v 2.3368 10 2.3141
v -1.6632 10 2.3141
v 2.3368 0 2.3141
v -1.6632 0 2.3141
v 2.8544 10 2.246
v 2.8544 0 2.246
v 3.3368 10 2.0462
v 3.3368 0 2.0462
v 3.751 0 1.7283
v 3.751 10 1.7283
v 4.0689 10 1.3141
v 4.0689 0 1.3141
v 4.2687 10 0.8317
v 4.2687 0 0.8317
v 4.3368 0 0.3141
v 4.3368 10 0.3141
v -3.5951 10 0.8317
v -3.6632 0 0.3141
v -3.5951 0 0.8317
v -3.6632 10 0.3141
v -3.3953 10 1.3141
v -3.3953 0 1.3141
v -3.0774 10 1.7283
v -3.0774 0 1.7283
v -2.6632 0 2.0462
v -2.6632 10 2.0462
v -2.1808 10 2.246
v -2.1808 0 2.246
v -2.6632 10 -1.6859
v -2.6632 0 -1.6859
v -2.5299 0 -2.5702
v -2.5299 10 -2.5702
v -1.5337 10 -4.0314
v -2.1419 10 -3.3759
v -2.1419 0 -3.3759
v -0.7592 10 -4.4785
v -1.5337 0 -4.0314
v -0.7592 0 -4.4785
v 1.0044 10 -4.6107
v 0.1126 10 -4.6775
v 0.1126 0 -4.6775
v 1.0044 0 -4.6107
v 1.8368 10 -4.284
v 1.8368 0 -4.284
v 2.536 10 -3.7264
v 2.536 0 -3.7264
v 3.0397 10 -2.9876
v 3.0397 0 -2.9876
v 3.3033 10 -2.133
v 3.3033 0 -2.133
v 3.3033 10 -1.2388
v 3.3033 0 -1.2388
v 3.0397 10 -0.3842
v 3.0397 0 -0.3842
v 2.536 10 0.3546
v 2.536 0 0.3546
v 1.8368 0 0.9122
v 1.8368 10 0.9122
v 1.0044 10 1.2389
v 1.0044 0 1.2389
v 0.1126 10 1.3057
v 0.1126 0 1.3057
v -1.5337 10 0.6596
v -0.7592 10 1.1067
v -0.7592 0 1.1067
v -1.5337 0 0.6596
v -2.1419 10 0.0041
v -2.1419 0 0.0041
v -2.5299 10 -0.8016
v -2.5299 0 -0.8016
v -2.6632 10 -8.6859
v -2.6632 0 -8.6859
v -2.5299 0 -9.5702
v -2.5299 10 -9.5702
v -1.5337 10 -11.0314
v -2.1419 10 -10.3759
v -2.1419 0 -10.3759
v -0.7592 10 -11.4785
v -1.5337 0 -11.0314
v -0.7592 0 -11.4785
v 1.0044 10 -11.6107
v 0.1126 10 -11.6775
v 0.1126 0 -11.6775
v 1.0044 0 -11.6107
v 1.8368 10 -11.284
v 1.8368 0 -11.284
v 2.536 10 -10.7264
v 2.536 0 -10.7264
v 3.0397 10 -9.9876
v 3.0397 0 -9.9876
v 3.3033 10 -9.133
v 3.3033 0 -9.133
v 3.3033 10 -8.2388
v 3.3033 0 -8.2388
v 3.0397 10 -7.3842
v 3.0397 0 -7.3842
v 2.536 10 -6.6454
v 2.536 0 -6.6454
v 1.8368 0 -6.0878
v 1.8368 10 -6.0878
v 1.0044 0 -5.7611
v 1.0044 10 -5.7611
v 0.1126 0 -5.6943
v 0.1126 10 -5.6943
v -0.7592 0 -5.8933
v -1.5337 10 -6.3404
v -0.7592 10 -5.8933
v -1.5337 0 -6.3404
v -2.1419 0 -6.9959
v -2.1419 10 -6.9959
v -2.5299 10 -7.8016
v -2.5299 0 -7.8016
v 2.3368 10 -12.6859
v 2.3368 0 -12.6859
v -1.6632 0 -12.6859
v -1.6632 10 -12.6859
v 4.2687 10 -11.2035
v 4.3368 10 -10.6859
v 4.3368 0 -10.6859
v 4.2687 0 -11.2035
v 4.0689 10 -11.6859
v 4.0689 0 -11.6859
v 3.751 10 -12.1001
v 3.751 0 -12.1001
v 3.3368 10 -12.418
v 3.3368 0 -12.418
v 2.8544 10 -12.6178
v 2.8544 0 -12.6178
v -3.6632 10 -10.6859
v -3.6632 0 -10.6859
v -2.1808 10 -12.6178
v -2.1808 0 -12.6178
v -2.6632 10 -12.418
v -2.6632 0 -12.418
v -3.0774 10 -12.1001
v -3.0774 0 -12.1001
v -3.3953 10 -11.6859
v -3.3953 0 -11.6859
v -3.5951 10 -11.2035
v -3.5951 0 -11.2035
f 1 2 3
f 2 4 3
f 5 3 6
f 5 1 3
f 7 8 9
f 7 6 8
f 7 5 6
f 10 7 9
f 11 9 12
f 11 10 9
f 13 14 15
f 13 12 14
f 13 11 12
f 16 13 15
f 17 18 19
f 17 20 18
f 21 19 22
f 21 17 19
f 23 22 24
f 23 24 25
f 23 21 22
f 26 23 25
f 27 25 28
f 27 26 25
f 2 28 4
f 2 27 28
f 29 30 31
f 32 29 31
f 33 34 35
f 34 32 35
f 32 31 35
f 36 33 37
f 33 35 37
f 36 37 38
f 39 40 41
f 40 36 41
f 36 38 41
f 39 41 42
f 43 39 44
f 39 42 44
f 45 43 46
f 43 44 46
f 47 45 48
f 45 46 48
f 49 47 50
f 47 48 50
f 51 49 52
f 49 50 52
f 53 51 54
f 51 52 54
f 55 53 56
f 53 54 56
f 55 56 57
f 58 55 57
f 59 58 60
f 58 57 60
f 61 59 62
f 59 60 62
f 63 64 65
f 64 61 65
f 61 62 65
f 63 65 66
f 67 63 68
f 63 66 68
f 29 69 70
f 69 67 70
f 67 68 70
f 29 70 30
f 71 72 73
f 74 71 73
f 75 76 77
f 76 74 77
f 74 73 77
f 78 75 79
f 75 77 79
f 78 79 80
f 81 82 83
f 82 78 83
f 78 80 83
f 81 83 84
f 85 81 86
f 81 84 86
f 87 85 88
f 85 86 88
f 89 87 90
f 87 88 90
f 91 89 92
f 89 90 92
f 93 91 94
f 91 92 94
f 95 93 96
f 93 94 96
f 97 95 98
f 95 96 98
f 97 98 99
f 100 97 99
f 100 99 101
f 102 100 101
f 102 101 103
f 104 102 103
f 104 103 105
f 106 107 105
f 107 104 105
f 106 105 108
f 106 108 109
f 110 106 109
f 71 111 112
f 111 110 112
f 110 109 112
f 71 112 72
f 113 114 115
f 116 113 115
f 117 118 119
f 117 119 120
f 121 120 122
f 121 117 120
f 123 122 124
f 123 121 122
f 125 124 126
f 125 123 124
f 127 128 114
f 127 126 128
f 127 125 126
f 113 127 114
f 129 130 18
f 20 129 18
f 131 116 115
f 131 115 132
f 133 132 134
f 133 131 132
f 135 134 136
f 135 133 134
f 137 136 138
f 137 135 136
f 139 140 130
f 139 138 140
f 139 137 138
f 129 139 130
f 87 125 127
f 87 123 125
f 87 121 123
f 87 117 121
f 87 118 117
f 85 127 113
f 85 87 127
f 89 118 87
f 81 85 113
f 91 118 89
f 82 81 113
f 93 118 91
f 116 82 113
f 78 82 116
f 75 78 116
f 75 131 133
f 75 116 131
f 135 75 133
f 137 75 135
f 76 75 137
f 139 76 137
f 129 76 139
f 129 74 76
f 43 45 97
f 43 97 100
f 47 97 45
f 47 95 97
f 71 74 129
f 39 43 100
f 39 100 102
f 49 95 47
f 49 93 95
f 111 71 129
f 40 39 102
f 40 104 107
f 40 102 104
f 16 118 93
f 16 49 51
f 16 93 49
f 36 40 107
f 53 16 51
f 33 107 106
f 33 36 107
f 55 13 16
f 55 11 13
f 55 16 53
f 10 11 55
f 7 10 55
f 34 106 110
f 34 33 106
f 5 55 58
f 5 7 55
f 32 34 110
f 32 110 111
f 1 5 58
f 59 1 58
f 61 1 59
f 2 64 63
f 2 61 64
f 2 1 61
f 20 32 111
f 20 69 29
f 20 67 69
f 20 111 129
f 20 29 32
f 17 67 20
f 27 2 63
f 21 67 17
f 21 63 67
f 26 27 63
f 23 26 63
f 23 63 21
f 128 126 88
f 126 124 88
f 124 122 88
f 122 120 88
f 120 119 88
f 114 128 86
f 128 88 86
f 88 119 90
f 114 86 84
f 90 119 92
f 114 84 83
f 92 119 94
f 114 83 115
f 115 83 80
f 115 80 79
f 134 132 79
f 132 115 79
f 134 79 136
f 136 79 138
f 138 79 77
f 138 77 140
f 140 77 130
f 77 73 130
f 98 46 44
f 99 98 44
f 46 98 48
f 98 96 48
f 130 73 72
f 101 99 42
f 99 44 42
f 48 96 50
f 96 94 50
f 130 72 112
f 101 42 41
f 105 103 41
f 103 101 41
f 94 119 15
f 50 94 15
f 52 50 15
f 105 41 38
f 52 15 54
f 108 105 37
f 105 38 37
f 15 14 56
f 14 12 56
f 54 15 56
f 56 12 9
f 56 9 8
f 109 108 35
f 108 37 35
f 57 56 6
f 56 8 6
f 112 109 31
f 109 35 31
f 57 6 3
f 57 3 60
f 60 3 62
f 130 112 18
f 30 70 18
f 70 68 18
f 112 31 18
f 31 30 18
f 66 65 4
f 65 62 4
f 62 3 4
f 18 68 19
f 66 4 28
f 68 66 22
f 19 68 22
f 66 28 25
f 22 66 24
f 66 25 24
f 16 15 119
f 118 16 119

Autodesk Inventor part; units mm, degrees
ref_plane "YZ Plane" through (0, 0, 0) normal (1, 0, 0) x (0, 1, 0)
ref_plane "XZ Plane" through (0, 0, 0) normal (0, 1, 0) x (-1, 0, 0)
ref_plane "XY Plane" through (0, 0, 0) normal (0, 0, 1) x (1, 0, 0)
sketch "Szkic1" plane through (0, 0, 0) normal (0, 1, 0) x (-1, 0, 0)
  circle A0 centre (-0.3368, -8.6859) radius 3
  circle A1 centre (-0.3368, -1.6859) radius 3
  line L0 (3.6632, 2.3141) -> (-4.3368, 2.3141)
  line L1 (-4.3368, 2.3141) -> (-4.3368, -12.6859)
  line L2 (-4.3368, -12.6859) -> (3.6632, -12.6859)
  line L3 (3.6632, -12.6859) -> (3.6632, 2.3141)
  point P0 (0, 0)
  dimension "d0" = 6
  dimension "d1" = 6
  dimension "d2" = 7
  dimension "d3" = 8
  dimension "d4" = 15
  dimension "d5" = 4
  dimension "d6" = 4
extrude "Wyciągnięcie proste1" add sketch "Szkic1" along normal blind 10
fillet "Zaokrąglenie1" radius 2 4 edges at (4.3368, 5, 2.3141) (-3.6632, 5, 2.3141) (4.3368, 5, -12.6859) (-3.6632, 5, -12.6859)
properties part number "obudowa"
